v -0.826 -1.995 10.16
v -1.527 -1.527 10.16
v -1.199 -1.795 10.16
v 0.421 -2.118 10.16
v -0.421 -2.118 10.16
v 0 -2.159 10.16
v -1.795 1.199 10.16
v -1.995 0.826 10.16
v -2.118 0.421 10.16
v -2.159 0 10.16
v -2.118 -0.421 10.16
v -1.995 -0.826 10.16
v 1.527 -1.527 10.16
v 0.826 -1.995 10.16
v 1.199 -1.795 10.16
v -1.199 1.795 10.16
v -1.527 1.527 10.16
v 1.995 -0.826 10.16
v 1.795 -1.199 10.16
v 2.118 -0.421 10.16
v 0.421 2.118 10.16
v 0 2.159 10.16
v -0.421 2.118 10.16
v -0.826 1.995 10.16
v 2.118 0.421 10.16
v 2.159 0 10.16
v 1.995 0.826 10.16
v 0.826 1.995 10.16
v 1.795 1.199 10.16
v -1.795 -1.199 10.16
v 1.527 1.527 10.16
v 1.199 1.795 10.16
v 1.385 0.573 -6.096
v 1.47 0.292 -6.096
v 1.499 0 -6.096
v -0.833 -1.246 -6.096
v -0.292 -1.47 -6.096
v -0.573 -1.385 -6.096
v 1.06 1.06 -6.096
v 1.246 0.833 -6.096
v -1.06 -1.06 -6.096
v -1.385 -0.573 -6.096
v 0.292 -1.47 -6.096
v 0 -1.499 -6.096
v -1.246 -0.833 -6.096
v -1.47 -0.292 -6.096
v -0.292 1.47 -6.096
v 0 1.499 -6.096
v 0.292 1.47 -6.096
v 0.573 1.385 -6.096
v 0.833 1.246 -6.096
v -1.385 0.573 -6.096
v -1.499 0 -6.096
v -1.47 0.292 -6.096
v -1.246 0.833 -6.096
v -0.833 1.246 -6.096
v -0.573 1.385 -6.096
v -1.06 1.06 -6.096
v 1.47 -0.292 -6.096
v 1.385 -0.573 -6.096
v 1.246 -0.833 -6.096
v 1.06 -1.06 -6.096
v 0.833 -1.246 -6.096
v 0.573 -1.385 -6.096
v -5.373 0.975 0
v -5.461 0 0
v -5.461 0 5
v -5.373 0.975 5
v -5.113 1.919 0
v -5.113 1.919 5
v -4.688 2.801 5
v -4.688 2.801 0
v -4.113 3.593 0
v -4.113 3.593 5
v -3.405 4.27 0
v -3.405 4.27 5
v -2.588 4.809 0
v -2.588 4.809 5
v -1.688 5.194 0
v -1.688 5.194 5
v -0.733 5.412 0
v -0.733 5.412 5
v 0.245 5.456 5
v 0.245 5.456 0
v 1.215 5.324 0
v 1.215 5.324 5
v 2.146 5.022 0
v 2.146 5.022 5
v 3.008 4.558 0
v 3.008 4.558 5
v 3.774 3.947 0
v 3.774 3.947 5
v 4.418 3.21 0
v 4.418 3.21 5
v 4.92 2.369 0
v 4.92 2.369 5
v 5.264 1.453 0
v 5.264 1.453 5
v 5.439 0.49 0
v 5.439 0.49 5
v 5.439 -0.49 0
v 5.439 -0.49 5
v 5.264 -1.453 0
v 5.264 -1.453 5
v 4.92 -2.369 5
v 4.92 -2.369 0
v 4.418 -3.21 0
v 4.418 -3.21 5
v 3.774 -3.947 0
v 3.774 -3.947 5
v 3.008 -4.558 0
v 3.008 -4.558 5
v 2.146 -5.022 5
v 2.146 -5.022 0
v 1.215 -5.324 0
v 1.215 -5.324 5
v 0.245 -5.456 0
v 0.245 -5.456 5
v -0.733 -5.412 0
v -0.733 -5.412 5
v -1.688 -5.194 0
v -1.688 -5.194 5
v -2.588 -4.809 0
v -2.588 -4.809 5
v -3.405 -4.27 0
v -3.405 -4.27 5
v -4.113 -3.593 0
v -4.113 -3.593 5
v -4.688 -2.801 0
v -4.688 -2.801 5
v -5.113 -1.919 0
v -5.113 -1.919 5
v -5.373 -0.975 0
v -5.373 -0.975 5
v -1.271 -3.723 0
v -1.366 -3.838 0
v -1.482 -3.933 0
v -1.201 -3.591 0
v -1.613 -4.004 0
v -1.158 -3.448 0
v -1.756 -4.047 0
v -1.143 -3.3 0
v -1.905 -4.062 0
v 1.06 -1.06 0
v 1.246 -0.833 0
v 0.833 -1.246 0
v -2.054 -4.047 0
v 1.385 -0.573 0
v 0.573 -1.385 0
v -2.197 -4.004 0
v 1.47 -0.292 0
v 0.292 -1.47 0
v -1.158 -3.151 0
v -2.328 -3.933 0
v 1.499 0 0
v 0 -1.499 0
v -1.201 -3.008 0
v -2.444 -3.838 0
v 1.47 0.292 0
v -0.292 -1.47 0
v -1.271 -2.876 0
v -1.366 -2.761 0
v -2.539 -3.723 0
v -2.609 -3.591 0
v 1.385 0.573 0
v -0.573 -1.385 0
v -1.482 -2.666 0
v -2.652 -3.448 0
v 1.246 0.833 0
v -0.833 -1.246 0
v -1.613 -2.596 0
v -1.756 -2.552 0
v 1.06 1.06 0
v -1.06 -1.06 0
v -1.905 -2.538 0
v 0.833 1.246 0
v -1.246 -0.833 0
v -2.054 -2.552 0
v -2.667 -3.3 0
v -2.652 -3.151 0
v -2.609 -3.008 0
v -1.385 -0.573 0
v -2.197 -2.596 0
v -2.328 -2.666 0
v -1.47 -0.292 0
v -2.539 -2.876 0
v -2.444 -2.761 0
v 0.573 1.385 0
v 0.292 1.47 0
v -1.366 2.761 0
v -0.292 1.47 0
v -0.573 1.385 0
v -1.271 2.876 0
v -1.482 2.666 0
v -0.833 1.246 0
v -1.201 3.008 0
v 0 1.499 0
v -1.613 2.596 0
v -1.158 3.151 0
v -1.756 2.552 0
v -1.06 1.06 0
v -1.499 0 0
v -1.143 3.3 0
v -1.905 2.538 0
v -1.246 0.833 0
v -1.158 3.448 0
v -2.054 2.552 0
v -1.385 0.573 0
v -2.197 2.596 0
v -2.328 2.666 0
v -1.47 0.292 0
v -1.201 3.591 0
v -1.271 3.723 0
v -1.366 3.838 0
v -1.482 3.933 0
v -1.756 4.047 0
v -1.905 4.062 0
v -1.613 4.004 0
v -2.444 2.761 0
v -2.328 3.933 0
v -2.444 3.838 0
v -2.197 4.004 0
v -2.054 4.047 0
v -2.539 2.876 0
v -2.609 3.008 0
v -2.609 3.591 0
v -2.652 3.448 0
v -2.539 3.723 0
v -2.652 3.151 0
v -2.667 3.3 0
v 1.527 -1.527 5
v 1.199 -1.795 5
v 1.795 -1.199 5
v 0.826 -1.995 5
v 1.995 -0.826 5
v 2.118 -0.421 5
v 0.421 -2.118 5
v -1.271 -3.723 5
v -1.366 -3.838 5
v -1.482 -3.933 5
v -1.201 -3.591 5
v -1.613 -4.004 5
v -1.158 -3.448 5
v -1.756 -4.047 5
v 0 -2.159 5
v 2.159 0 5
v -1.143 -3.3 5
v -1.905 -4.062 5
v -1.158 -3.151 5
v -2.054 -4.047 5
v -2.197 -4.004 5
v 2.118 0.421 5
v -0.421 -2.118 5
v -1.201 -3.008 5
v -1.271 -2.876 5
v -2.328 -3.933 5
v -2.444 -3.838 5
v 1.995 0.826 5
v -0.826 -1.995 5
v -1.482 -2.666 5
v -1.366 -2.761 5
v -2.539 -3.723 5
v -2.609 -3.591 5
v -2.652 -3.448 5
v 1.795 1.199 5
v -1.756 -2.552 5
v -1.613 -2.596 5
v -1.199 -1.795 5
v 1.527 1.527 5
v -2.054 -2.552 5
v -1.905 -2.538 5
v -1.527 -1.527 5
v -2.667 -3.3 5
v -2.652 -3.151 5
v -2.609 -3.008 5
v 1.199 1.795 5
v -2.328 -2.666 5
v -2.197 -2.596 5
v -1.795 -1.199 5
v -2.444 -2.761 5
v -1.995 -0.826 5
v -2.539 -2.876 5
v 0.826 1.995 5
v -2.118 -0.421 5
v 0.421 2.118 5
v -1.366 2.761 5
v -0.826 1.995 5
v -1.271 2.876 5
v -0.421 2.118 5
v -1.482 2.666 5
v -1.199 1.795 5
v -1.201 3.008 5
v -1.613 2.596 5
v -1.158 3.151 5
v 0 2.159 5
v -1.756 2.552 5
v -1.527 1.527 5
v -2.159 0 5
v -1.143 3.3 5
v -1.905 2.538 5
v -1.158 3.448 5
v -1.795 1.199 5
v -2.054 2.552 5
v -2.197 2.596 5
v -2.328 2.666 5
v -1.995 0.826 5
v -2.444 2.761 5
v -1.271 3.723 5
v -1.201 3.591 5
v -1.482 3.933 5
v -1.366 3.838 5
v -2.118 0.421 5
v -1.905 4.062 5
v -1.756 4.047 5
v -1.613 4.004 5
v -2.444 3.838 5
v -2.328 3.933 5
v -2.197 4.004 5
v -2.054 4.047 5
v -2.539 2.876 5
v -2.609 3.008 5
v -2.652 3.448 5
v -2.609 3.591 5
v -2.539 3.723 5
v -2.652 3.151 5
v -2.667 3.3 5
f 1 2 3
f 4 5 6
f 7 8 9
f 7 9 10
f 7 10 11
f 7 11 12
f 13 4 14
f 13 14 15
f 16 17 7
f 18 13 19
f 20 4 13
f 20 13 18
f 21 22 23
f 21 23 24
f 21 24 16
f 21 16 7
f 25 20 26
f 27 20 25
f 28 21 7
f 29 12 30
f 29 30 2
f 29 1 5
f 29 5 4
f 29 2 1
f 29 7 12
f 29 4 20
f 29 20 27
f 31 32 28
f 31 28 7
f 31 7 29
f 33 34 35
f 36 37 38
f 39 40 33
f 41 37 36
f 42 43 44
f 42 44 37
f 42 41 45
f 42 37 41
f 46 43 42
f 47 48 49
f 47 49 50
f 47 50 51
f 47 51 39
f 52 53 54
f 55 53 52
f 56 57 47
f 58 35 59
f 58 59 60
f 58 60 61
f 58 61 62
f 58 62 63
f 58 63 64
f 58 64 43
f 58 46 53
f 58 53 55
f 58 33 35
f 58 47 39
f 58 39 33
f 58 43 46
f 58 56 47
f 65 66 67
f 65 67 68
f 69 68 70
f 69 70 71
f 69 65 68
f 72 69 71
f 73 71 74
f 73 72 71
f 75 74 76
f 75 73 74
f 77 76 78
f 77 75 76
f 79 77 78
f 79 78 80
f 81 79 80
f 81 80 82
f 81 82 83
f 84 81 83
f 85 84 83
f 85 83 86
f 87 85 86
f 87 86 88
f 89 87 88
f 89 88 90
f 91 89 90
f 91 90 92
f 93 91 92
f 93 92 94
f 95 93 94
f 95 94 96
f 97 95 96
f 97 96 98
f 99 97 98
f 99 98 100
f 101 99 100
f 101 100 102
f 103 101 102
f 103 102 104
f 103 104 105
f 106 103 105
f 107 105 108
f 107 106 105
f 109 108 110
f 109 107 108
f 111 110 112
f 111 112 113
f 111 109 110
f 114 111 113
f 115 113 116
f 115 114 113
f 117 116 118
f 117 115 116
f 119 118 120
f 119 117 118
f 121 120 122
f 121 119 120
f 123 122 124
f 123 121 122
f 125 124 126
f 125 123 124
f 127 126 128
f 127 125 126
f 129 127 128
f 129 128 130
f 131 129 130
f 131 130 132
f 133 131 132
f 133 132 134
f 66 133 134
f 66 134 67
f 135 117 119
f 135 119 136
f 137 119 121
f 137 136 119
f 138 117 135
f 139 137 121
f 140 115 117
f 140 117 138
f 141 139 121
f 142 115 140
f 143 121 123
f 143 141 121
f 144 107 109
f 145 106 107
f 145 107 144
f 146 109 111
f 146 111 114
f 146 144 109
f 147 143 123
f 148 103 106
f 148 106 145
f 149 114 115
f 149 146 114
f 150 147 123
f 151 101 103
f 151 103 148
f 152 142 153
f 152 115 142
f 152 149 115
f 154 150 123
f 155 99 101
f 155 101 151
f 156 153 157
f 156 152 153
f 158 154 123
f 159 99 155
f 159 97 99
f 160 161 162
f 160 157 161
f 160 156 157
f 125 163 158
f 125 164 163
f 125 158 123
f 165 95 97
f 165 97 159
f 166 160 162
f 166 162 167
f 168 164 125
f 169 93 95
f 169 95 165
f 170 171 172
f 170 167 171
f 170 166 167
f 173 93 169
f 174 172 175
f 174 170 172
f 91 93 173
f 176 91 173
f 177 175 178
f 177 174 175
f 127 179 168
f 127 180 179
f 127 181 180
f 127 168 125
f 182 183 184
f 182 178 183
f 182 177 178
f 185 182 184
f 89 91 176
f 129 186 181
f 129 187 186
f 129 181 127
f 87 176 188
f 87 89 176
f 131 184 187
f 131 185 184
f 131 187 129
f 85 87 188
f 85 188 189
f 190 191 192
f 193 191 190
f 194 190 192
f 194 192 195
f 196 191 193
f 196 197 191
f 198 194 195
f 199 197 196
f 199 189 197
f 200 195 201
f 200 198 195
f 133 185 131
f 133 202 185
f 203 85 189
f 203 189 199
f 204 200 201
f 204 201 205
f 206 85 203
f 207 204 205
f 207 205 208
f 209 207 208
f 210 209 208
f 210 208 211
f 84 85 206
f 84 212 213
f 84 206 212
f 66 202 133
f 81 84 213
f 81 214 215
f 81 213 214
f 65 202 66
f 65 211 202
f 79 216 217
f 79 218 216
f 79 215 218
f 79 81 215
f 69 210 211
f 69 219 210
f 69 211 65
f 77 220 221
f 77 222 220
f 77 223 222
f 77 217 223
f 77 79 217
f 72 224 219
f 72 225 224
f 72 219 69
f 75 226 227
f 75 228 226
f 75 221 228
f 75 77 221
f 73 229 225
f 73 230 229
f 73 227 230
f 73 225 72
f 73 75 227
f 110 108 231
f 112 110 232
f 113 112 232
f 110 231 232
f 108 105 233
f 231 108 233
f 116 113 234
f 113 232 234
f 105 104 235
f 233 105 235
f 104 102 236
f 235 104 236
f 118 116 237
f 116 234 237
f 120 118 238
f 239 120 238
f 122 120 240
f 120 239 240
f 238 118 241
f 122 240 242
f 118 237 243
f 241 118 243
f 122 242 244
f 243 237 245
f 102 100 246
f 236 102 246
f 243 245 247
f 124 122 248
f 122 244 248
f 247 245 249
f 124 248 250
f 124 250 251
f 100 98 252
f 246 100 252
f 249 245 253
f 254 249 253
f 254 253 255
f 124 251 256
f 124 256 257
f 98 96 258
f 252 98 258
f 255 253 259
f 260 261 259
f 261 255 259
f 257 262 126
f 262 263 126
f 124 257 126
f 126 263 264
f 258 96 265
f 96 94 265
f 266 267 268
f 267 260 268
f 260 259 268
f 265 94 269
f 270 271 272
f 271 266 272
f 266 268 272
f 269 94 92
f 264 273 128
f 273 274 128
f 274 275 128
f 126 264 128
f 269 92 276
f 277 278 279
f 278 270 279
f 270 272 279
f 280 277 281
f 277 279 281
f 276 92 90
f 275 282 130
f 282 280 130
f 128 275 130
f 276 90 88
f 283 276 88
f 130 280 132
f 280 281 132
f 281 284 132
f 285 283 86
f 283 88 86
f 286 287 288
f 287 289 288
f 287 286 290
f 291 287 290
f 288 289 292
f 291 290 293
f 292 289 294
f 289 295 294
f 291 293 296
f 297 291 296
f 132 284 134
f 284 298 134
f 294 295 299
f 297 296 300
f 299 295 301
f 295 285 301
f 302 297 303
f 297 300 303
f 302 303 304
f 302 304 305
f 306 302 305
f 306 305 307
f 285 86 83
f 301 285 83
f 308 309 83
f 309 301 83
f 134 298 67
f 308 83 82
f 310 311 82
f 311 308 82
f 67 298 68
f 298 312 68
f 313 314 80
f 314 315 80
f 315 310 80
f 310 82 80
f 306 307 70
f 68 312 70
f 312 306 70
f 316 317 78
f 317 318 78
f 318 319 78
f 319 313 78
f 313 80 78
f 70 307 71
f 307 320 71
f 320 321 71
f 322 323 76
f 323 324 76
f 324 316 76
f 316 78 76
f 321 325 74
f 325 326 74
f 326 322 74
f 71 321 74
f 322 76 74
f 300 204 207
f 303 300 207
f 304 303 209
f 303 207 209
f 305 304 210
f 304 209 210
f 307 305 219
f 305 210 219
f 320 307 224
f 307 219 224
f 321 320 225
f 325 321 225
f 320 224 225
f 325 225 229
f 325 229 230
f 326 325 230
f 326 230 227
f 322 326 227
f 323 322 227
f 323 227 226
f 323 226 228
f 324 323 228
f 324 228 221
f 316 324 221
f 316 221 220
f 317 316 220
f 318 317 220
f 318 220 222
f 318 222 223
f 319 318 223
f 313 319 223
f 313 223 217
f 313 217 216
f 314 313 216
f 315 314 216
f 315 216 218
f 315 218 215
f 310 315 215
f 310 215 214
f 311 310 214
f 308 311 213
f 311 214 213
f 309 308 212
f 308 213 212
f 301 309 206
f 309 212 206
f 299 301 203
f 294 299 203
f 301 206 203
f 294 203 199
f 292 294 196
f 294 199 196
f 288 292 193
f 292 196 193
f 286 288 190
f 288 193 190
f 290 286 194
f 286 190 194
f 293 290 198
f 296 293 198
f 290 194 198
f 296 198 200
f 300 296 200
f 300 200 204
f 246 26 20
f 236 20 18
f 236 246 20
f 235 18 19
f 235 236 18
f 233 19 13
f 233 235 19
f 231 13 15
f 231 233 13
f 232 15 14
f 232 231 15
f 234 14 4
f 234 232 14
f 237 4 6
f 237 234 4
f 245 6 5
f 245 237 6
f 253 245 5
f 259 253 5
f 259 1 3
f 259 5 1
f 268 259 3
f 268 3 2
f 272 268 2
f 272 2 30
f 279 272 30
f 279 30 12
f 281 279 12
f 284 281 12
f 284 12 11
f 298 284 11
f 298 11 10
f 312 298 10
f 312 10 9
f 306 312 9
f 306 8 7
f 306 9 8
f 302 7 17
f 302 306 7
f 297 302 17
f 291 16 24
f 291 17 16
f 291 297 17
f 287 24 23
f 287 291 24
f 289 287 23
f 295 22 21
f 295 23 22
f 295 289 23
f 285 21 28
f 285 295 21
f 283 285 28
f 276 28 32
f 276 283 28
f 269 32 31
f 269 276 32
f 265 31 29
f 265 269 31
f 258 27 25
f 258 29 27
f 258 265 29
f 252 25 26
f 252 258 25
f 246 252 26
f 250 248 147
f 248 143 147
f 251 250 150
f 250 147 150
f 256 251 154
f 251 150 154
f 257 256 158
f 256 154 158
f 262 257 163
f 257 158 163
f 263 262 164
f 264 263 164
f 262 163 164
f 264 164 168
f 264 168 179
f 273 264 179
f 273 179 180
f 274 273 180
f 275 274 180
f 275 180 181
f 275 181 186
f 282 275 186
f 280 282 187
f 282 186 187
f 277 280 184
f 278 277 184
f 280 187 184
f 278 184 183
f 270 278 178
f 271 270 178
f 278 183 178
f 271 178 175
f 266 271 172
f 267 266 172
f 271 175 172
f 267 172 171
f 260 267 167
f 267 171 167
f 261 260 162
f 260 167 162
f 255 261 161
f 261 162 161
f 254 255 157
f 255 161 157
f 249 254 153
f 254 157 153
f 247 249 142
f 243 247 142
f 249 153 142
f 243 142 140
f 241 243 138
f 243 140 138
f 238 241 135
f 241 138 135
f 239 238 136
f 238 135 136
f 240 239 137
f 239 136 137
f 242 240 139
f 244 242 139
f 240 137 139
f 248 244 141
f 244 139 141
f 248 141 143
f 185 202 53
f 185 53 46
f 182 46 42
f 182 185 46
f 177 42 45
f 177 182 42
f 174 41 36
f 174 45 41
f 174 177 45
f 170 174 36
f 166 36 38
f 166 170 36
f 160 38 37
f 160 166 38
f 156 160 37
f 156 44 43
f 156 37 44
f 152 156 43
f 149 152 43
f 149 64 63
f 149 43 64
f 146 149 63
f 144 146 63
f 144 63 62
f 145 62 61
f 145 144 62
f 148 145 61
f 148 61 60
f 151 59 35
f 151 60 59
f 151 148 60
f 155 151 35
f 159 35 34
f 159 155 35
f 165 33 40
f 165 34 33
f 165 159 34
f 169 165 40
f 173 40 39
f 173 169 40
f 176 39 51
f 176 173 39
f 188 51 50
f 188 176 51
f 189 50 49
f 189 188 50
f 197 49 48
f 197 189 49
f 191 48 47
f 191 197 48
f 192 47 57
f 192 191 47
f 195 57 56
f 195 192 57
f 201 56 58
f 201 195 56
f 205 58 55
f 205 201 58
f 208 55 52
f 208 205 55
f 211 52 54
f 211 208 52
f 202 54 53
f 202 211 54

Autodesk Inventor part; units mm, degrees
ref_plane "YZ Plane" through (0, 0, 0) normal (1, 0, 0) x (0, 1, 0)
ref_plane "XZ Plane" through (0, 0, 0) normal (0, 1, 0) x (-1, 0, 0)
ref_plane "XY Plane" through (0, 0, 0) normal (0, 0, 1) x (1, 0, 0)
sketch "Sketch1" plane through (0, 0, 0) normal (0, 0, 1) x (1, 0, 0)
  circle A0 centre (0, 0) radius 2.159
  dimension "d0" = 4.318
extrude "Extrusion1" add sketch "Sketch1" along normal blind 10.16
sketch "Sketch2" plane through (0, 0, 0) normal (0, 0, -1) x (-1, 0, 0)
  circle A0 centre (0, 0) radius 2.159 projected
  circle A1 centre (0, 0) radius 1.4986
  dimension "d3" = 2.9972
extrude "Extrusion2" add sketch "Sketch2" along normal blind 6.096 contours A1
sketch "Sketch3" plane through (0, 0, 0) normal (0, 0, -1) x (-1, 0, 0)
  circle A0 centre (0, 0) radius 2.159 projected
  circle A1 centre (0, 0) radius 5.461
  dimension "d6" = 10.922
extrude "Extrusion3" add sketch "Sketch3" against normal blind 5
sketch "Sketch4" plane through (0, 0, 5) normal (0, 0, 1) x (1, 0, 0)
  circle A0 centre (0, 0) radius 2.159 projected
  line L0 (-7.6454, 0) -> (7.6454, 0) projected
  point P0 (3.81, 0)
  point P1 (-1.905, 3.2996)
  point P2 (-1.905, -3.2996)
  dimension "d9" = 3.81
  dimension "d12" = 360
hole "Hole1" at (-1.905, 3.2996, 5) at (-1.905, -3.2996, 5) direction (0, 0, -1) diameter 1.524 end through all
properties part number "Post"
